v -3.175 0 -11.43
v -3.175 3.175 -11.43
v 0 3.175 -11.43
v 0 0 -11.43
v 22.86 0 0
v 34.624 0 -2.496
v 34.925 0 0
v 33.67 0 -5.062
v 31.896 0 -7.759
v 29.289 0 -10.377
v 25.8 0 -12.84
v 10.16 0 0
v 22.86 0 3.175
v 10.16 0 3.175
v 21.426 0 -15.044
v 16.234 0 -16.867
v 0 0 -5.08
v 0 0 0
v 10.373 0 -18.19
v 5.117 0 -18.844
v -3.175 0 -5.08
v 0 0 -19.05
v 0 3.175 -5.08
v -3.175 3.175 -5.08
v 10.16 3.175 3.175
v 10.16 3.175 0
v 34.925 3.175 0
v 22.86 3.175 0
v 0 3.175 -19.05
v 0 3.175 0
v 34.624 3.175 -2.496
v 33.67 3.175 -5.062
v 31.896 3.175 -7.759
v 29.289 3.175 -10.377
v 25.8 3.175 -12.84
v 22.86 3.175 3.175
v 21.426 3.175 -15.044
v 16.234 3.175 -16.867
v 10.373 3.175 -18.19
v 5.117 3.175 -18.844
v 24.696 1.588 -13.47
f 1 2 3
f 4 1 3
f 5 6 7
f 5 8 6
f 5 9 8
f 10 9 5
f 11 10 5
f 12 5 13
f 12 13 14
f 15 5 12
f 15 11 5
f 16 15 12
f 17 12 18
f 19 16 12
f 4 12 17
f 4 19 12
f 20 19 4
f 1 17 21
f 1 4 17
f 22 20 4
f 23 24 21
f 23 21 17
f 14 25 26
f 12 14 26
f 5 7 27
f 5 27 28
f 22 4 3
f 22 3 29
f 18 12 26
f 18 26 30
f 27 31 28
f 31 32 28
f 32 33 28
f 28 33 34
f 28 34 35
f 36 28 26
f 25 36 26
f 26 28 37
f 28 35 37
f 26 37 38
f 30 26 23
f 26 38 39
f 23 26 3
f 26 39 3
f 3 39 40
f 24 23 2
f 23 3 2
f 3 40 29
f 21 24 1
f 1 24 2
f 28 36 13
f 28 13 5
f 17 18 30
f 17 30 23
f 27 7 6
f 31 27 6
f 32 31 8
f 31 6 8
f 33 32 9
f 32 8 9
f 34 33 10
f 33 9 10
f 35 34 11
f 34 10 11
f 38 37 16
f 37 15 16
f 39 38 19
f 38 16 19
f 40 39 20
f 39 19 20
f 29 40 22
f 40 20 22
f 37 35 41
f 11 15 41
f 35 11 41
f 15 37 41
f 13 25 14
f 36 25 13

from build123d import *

# Parameters (mm, degrees)
BOSS_EXTRUDE2_DEPTH = 3.175
SKETCH6_W           = 3.175
SKETCH6_H           = 6.35
SKETCH6_W_2         = 12.7
SKETCH6_H_2         = 3.175
BOSS_EXTRUDE4_DEPTH = 3.175


with BuildPart() as part:
    # Sketch5 → Boss-Extrude2 (new body)
    with BuildSketch(Plane(origin=(0, 0, 0), x_dir=(1, 0, 0), z_dir=(0, 1, 0))):
        with BuildLine():
            Line((0, 0), (0, 19.05))
            add(Edge.make_bspline(
                [(34.925, 0), (34.925, 19.05), (0, 19.05)],
                knots=[3.141592654, 3.141592654, 3.141592654, 4.71238898, 4.71238898, 4.71238898], degree=2, weights=[1, 0.707106781, 1]))
            Line((34.925, 0), (0, 0))
        make_face()
    extrude(amount=BOSS_EXTRUDE2_DEPTH)

    # Sketch6 → Boss-Extrude4 (add)
    with BuildSketch(Plane(origin=(0, 3.175, 0), x_dir=(1, 0, 0), z_dir=(0, 1, 0))):
        with Locations((-1.5875, 8.255)):
            Rectangle(SKETCH6_W, SKETCH6_H)
        with Locations((16.51, -1.5875)):
            Rectangle(SKETCH6_W_2, SKETCH6_H_2)
    extrude(amount=-BOSS_EXTRUDE4_DEPTH)


solid = part.part
